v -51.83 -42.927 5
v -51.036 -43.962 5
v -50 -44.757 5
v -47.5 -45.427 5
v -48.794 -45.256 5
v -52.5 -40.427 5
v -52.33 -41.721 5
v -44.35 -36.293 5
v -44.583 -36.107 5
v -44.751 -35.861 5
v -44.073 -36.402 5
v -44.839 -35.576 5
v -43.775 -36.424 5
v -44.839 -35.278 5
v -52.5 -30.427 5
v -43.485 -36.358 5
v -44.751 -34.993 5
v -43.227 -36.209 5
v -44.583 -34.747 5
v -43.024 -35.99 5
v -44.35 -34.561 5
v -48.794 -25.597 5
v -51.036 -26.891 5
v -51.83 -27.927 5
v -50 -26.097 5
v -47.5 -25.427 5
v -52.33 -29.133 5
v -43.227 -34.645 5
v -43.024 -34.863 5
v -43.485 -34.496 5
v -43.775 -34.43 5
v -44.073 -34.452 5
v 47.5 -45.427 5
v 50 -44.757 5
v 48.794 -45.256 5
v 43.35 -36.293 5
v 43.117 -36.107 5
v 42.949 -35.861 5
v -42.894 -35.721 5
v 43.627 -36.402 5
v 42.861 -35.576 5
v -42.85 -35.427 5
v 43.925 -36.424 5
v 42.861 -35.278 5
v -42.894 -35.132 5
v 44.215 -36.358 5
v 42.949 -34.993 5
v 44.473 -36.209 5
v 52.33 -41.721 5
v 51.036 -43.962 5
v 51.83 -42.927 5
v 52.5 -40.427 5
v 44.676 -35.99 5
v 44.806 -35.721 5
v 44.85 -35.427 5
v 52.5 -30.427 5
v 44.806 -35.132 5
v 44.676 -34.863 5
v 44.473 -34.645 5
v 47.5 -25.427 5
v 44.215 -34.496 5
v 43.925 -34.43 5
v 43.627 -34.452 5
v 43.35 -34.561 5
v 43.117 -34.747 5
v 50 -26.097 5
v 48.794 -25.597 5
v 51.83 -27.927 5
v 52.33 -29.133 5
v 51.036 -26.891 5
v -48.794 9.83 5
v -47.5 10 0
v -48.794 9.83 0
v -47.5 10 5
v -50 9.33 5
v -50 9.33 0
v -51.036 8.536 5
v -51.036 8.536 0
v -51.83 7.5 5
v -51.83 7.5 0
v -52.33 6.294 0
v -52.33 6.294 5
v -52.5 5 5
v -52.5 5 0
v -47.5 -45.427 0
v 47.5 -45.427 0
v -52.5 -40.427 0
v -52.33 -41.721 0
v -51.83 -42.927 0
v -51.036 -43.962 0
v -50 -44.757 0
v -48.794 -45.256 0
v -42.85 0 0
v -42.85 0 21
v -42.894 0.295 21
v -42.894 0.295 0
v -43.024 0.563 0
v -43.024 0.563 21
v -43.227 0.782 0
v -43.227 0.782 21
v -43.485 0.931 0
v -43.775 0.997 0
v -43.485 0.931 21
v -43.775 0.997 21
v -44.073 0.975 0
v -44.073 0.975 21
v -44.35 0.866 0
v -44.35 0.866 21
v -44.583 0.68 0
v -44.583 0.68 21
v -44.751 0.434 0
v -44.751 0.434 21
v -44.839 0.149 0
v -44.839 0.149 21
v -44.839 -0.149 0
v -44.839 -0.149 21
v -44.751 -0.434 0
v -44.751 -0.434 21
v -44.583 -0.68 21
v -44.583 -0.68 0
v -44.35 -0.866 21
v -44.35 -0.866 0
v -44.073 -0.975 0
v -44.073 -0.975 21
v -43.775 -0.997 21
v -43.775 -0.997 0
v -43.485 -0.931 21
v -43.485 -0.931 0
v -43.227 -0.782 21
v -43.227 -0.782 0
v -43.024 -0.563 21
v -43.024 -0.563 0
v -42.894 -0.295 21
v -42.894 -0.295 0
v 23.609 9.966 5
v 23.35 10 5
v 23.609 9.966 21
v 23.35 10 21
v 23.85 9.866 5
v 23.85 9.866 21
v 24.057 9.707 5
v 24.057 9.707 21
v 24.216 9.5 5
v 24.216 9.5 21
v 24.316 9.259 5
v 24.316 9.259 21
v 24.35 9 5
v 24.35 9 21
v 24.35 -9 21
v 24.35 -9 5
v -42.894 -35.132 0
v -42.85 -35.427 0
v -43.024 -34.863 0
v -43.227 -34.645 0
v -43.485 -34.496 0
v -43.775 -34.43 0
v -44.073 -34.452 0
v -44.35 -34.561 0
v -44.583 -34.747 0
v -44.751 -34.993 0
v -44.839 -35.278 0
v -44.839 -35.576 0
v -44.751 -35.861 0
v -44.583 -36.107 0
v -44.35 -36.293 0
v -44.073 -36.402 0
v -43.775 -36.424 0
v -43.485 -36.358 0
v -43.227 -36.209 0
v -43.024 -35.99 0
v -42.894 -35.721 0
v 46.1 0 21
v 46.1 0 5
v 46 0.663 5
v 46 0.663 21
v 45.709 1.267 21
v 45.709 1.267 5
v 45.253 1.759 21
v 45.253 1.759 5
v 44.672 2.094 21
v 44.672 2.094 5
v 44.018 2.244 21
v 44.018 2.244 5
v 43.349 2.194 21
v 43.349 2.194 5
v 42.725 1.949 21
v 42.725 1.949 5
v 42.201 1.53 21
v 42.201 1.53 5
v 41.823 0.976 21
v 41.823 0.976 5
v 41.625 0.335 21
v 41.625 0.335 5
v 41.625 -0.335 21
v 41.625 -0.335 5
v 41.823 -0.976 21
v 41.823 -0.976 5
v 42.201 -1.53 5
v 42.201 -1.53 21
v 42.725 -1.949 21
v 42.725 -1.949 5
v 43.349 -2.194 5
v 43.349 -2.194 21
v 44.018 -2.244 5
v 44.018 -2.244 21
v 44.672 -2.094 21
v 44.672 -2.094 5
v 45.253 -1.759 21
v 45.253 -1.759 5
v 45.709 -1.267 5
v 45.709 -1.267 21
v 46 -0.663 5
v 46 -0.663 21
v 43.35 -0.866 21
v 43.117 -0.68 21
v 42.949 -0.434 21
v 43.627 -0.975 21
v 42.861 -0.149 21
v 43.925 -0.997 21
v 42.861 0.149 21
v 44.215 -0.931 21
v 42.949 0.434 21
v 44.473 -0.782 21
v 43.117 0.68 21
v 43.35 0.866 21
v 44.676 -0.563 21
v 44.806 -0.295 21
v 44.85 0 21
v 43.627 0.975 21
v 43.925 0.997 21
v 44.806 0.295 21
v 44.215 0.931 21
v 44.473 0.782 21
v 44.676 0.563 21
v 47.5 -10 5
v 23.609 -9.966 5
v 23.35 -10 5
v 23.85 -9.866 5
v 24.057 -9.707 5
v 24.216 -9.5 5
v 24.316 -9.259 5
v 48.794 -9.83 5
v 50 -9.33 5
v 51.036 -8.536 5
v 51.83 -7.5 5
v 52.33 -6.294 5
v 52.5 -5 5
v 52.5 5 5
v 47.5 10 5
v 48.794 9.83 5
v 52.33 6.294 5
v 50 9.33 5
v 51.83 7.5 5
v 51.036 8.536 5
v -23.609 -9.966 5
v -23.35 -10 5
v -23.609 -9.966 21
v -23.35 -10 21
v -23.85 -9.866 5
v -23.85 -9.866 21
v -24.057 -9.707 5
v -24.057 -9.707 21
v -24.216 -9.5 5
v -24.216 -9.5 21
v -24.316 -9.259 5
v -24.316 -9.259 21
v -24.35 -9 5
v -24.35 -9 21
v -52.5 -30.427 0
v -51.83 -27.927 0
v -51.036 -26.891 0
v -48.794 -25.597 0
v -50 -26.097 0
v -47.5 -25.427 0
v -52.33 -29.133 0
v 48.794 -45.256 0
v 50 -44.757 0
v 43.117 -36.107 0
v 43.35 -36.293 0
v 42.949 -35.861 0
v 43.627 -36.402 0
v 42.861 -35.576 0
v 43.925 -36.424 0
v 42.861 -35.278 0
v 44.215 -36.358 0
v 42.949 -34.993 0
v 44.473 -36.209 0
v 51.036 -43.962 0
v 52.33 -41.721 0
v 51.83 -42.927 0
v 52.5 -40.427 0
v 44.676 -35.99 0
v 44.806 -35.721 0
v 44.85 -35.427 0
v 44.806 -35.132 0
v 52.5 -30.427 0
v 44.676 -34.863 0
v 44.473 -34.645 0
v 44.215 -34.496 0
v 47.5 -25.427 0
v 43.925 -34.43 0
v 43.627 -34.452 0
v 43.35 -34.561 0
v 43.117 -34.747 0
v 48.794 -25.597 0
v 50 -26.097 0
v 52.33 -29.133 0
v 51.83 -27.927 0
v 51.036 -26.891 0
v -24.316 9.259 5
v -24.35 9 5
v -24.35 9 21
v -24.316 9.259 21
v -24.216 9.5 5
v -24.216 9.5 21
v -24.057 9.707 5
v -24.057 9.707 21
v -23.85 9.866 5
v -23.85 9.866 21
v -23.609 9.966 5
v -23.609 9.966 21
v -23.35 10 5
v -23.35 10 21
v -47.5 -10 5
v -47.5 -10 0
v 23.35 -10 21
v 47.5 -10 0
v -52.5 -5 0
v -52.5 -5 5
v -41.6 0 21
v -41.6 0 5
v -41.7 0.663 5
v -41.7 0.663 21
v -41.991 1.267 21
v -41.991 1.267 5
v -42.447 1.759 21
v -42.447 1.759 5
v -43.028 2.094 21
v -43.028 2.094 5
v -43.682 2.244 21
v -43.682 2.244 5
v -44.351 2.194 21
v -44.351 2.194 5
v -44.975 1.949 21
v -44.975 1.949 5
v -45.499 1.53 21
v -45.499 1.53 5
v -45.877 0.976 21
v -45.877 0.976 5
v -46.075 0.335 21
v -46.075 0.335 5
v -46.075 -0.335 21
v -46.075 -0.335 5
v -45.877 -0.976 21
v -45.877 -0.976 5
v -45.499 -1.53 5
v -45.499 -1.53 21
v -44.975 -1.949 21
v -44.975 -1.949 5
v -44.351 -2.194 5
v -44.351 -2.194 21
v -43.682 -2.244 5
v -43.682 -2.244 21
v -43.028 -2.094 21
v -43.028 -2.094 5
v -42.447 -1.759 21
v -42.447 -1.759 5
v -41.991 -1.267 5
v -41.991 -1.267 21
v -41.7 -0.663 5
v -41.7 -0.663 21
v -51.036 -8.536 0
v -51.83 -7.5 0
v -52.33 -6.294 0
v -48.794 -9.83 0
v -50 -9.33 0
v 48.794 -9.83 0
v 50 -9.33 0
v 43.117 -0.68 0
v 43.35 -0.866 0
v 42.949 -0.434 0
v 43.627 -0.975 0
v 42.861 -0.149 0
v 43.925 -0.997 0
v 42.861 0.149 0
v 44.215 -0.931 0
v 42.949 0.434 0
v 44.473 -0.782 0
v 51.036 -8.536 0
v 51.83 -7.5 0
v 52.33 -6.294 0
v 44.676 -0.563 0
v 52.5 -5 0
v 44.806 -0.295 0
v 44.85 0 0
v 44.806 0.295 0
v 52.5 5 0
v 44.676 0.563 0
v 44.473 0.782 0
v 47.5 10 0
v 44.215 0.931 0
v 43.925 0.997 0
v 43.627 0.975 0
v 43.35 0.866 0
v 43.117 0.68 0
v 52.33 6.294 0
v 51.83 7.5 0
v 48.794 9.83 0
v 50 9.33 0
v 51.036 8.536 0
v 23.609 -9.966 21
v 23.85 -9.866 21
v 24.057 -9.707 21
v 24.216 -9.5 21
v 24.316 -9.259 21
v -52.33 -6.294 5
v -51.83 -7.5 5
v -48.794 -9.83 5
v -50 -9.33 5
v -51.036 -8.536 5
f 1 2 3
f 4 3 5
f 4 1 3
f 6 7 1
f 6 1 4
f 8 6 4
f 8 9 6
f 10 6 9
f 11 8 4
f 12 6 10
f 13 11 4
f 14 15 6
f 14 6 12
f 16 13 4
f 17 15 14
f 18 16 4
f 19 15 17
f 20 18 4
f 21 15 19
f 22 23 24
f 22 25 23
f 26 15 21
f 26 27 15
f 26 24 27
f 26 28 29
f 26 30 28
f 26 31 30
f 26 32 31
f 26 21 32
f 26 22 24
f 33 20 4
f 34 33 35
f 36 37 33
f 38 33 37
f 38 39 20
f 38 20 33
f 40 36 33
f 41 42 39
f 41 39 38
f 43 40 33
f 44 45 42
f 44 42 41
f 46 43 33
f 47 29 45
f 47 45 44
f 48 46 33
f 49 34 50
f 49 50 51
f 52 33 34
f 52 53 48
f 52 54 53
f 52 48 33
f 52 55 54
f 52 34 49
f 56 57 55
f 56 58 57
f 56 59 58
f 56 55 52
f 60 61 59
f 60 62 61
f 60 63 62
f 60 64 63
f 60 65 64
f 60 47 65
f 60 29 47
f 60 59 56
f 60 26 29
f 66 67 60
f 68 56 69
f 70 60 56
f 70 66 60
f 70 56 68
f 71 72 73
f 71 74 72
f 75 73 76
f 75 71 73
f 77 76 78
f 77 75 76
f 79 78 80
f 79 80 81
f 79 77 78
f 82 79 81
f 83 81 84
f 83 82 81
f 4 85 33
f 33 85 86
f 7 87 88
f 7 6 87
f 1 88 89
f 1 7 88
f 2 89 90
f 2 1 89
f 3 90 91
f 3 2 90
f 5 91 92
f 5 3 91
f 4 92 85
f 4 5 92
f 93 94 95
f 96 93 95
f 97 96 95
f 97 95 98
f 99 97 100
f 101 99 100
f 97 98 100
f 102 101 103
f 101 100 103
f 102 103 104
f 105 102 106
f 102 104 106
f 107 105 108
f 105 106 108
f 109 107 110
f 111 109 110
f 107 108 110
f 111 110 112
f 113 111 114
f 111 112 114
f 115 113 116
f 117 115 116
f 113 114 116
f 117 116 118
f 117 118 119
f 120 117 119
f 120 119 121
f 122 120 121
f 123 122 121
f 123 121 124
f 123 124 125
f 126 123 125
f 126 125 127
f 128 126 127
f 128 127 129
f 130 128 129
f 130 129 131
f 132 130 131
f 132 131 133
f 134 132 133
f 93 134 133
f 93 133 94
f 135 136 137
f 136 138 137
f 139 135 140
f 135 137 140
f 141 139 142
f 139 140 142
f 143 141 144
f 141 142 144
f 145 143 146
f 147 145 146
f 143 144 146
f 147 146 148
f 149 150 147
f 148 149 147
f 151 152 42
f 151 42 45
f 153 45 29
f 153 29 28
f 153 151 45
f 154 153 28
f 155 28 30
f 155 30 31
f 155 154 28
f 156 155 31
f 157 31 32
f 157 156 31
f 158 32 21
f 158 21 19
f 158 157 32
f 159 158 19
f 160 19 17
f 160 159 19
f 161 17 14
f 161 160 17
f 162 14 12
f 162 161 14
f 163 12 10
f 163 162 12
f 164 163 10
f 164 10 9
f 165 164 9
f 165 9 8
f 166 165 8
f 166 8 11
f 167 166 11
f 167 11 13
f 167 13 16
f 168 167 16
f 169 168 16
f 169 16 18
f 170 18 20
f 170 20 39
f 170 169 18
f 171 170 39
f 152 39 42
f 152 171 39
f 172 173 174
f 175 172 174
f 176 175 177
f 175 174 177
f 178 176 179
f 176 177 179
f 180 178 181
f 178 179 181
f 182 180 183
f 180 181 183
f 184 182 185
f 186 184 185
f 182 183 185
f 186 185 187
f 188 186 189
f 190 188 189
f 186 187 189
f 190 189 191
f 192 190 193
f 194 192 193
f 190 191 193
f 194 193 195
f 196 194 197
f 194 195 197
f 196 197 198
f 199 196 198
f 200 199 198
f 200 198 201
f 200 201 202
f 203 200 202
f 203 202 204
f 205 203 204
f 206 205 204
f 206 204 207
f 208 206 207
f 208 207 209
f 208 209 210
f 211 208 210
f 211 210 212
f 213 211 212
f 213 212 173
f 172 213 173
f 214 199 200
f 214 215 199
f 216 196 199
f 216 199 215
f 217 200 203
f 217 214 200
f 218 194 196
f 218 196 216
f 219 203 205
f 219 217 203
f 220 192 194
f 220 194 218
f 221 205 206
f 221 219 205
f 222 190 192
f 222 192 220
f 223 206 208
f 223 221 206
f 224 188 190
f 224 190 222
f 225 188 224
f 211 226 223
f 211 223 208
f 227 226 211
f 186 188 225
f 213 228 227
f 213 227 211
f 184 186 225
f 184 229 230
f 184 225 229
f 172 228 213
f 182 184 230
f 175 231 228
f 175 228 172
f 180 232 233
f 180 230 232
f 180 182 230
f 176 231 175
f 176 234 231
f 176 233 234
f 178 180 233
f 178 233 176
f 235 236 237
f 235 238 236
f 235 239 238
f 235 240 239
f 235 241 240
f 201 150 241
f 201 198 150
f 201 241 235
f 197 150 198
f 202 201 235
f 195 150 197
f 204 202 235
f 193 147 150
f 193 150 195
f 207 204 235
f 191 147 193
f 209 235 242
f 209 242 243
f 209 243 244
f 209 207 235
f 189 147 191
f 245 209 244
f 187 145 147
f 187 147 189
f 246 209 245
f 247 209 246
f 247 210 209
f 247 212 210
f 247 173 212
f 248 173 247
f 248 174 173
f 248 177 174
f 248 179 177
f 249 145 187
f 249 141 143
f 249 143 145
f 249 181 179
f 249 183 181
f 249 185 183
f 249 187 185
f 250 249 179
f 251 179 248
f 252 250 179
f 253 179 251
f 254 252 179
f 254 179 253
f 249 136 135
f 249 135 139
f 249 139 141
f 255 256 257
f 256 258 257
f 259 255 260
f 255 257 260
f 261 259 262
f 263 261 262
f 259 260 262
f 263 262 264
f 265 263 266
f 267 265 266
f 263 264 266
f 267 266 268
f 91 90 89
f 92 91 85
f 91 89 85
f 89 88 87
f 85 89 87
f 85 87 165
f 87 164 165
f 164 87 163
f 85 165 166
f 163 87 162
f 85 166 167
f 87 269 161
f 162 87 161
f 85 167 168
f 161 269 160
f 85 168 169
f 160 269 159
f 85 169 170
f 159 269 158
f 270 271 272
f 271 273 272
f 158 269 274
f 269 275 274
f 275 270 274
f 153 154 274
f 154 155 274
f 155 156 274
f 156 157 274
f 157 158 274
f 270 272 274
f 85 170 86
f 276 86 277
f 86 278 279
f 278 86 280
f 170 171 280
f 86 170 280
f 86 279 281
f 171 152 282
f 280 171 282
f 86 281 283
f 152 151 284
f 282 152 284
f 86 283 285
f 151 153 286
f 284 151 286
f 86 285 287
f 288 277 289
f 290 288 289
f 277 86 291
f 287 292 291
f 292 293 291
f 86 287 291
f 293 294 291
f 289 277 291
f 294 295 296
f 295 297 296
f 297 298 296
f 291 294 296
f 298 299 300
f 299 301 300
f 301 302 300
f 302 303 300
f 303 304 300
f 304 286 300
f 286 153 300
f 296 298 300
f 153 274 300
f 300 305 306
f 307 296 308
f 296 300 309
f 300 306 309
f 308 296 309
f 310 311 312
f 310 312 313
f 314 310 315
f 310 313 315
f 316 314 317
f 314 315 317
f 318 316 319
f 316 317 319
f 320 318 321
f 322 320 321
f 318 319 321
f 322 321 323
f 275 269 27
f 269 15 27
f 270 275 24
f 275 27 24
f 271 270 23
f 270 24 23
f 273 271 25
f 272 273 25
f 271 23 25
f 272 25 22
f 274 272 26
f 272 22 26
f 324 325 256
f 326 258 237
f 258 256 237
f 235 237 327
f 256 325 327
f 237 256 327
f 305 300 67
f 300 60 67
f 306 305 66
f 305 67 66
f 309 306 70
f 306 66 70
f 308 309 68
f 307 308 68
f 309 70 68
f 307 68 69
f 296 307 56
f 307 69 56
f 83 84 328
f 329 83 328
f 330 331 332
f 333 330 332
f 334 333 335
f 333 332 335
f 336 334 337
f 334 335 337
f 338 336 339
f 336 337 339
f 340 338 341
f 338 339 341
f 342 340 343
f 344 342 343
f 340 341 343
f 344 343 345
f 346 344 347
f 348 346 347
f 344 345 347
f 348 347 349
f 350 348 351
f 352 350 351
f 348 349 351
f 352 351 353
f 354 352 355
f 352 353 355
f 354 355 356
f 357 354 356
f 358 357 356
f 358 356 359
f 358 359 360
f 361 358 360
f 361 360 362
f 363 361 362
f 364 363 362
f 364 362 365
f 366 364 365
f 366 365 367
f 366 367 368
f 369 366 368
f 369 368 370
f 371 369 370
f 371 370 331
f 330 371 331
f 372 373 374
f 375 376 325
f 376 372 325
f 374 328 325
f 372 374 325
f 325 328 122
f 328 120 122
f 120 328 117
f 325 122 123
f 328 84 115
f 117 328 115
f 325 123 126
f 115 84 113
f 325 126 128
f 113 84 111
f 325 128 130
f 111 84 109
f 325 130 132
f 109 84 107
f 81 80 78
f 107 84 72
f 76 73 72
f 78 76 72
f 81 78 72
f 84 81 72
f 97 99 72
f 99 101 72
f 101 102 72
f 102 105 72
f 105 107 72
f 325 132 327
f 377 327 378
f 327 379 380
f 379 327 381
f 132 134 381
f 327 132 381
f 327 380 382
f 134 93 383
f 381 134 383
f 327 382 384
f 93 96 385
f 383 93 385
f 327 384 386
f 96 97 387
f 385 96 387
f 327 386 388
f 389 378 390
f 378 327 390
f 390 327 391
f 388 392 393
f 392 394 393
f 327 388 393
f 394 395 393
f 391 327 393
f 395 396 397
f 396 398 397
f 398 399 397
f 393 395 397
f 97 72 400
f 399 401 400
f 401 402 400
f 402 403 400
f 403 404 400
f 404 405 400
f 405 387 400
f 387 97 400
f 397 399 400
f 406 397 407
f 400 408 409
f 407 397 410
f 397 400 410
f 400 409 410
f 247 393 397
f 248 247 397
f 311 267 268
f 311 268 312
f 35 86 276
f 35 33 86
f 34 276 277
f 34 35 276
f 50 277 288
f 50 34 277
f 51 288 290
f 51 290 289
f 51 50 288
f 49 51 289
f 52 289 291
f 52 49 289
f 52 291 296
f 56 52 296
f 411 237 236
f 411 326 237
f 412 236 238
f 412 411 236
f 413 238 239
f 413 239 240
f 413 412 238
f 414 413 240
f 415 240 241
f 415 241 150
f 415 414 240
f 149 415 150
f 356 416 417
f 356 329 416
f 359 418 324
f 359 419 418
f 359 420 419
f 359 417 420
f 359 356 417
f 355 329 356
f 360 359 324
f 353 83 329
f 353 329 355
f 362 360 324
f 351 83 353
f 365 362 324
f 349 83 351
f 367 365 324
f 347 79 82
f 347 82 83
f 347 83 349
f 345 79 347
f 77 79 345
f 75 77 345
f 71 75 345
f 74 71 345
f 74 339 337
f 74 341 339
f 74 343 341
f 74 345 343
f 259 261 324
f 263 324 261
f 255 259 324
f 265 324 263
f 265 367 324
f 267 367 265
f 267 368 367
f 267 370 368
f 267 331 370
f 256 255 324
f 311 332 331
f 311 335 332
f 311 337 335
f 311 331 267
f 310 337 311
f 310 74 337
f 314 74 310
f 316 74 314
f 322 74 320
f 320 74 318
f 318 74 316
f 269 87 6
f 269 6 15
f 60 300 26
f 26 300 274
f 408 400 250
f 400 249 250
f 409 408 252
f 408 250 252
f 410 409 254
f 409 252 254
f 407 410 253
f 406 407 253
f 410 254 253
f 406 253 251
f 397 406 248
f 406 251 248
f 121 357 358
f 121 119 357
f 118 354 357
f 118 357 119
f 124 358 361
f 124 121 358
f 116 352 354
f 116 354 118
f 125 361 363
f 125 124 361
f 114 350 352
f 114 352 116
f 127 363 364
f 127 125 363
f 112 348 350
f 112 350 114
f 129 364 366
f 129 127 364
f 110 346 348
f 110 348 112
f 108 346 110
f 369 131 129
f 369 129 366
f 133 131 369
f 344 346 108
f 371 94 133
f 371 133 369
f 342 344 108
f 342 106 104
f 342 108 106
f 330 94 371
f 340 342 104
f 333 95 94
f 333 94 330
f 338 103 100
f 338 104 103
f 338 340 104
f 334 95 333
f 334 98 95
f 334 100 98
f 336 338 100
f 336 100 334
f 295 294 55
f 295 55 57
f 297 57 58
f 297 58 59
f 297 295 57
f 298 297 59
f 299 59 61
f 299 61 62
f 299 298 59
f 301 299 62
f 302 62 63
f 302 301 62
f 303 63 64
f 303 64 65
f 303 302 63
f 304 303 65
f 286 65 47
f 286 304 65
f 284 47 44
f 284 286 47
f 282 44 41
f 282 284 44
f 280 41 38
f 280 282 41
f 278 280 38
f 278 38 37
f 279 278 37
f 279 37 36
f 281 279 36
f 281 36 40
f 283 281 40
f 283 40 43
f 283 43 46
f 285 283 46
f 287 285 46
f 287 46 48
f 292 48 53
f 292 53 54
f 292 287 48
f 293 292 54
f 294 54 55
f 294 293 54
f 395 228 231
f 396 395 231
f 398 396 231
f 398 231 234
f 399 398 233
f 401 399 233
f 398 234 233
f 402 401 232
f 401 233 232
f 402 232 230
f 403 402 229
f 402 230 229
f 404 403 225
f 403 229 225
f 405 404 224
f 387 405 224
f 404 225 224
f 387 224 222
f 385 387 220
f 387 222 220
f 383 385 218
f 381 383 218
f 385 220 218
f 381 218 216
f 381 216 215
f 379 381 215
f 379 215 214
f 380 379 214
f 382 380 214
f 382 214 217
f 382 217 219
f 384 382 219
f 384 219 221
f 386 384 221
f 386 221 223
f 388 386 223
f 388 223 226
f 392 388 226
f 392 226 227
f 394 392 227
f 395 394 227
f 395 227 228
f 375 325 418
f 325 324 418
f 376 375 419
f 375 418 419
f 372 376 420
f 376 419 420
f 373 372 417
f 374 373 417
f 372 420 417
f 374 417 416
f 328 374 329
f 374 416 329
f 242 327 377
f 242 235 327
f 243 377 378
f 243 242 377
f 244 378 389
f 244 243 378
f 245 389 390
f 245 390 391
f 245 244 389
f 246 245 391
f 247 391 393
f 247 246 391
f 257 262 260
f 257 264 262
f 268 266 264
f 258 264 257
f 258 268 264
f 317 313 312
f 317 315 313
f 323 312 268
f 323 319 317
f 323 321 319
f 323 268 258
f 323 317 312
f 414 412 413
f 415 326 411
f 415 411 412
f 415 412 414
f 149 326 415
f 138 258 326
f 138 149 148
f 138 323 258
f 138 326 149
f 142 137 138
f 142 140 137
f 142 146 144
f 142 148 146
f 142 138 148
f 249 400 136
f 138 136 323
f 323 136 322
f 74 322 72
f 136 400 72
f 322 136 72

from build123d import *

# Parameters (mm, degrees)
F0_W     = 48.7
F0_H     = 20
F1_DEPTH = 21
F0_W_2   = 52.5
F0_R     = 1
F2_DEPTH = 5
F0_R_2   = 2.25
F3_DEPTH = 5
F4_DEPTH = 21
F5_R     = 5
F5_2_R   = 5
F6_R     = 1
F7_R     = 1
F8_R     = 1
F9_DEPTH = 22.6


with BuildPart() as f1:
    # F0 (on Top) → F1 (new body)
    with BuildSketch(Plane.XY):
        Rectangle(F0_W, F0_H)
    extrude(amount=F1_DEPTH)

    # F0 (on Top) → F3 (join)
    with BuildSketch(Plane.XY):
        with BuildLine():
            Line((-52.5, -10), (-32.6696601125, -10))
            ThreePointArc((-32.6696601125, -10), (-29.8374146156, -5.3523313466), (-28.85, 0))
            ThreePointArc((-28.85, 0), (-29.8374146156, 5.3523313466), (-32.6696601125, 10))
            Line((-32.6696601125, 10), (-52.5, 10))
            Line((-52.5, 10), (-52.5, -10))
        make_face()
        with Locations((-43.85, 0)):
            Circle(F0_R_2, mode=Mode.SUBTRACT)
        with BuildLine():
            Line((-32.6696601125, -10), (-24.35, -10))
            Line((-24.35, -10), (-24.35, 10))
            Line((-24.35, 10), (-32.6696601125, 10))
            ThreePointArc((-32.6696601125, 10), (-29.8374146156, 5.3523313466), (-28.85, 0))
            ThreePointArc((-28.85, 0), (-29.8374146156, -5.3523313466), (-32.6696601125, -10))
        make_face()
        with BuildLine():
            ThreePointArc((32.6696601125, 10), (28.85, 0), (32.6696601125, -10))
            Line((32.6696601125, -10), (52.5, -10))
            Line((52.5, -10), (52.5, 10))
            Line((52.5, 10), (32.6696601125, 10))
        make_face()
        with Locations((43.85, 0)):
            Circle(F0_R_2, mode=Mode.SUBTRACT)
        with BuildLine():
            Line((24.35, 10), (24.35, -10))
            Line((24.35, -10), (32.6696601125, -10))
            ThreePointArc((32.6696601125, -10), (28.85, 0), (32.6696601125, 10))
            Line((32.6696601125, 10), (24.35, 10))
        make_face()
    extrude(amount=F3_DEPTH)

    # F0 (on Top) → F4 (join)
    with BuildSketch(Plane.XY):
        with Locations((-43.85, 0)):
            Circle(F0_R_2)
        with Locations((43.85, 0)):
            Circle(F0_R_2)
    extrude(amount=F4_DEPTH)

    # F5
    f5_edges = [f1.edges().sort_by_distance(p)[0] for p in [
        (-52.5, -10, 2.5),
        (52.5, -10, 2.5),
        (52.5, 10, 2.5),
        (-52.5, 10, 2.5),
    ]]
    fillet(f5_edges, radius=F5_R)

    # F6
    f6_edges = [f1.edges().sort_by_distance(p)[0] for p in [
        (24.35, -10, 13),
        (24.35, 10, 13),
        (-24.35, -10, 13),
        (-24.35, 10, 13),
    ]]
    fillet(f6_edges, radius=F6_R)

    # F7 (on face) + F8 (on face) → F9 (cut)
    with BuildSketch(Plane.XY.offset(21)):
        with Locations((-43.85, 0)):
            Circle(F7_R)
    with BuildSketch(Plane.XY.offset(21)):
        with Locations((43.85, 0)):
            Circle(F8_R)
    extrude(amount=-F9_DEPTH, mode=Mode.SUBTRACT)


with BuildPart() as f2:
    # F0 (on Top) → F2 (new body)
    with BuildSketch(Plane.XY):
        with Locations((-26.25, -35.4267337918)):
            Rectangle(F0_W_2, F0_H)
        with Locations((-43.85, -35.4267337918)):
            Circle(F0_R, mode=Mode.SUBTRACT)
        with Locations((26.25, -35.4267337918)):
            Rectangle(F0_W_2, F0_H)
        with Locations((43.85, -35.4267337918)):
            Circle(F0_R, mode=Mode.SUBTRACT)
    extrude(amount=F2_DEPTH)

    # F5#2
    f5_2_edges = [f2.edges().sort_by_distance(p)[0] for p in [
        (-52.5, -45.426734, 2.5),
        (-52.5, -25.426734, 2.5),
        (52.5, -45.426734, 2.5),
        (52.5, -25.426734, 2.5),
    ]]
    fillet(f5_2_edges, radius=F5_2_R)


solid = Compound([f1.part, f2.part])
